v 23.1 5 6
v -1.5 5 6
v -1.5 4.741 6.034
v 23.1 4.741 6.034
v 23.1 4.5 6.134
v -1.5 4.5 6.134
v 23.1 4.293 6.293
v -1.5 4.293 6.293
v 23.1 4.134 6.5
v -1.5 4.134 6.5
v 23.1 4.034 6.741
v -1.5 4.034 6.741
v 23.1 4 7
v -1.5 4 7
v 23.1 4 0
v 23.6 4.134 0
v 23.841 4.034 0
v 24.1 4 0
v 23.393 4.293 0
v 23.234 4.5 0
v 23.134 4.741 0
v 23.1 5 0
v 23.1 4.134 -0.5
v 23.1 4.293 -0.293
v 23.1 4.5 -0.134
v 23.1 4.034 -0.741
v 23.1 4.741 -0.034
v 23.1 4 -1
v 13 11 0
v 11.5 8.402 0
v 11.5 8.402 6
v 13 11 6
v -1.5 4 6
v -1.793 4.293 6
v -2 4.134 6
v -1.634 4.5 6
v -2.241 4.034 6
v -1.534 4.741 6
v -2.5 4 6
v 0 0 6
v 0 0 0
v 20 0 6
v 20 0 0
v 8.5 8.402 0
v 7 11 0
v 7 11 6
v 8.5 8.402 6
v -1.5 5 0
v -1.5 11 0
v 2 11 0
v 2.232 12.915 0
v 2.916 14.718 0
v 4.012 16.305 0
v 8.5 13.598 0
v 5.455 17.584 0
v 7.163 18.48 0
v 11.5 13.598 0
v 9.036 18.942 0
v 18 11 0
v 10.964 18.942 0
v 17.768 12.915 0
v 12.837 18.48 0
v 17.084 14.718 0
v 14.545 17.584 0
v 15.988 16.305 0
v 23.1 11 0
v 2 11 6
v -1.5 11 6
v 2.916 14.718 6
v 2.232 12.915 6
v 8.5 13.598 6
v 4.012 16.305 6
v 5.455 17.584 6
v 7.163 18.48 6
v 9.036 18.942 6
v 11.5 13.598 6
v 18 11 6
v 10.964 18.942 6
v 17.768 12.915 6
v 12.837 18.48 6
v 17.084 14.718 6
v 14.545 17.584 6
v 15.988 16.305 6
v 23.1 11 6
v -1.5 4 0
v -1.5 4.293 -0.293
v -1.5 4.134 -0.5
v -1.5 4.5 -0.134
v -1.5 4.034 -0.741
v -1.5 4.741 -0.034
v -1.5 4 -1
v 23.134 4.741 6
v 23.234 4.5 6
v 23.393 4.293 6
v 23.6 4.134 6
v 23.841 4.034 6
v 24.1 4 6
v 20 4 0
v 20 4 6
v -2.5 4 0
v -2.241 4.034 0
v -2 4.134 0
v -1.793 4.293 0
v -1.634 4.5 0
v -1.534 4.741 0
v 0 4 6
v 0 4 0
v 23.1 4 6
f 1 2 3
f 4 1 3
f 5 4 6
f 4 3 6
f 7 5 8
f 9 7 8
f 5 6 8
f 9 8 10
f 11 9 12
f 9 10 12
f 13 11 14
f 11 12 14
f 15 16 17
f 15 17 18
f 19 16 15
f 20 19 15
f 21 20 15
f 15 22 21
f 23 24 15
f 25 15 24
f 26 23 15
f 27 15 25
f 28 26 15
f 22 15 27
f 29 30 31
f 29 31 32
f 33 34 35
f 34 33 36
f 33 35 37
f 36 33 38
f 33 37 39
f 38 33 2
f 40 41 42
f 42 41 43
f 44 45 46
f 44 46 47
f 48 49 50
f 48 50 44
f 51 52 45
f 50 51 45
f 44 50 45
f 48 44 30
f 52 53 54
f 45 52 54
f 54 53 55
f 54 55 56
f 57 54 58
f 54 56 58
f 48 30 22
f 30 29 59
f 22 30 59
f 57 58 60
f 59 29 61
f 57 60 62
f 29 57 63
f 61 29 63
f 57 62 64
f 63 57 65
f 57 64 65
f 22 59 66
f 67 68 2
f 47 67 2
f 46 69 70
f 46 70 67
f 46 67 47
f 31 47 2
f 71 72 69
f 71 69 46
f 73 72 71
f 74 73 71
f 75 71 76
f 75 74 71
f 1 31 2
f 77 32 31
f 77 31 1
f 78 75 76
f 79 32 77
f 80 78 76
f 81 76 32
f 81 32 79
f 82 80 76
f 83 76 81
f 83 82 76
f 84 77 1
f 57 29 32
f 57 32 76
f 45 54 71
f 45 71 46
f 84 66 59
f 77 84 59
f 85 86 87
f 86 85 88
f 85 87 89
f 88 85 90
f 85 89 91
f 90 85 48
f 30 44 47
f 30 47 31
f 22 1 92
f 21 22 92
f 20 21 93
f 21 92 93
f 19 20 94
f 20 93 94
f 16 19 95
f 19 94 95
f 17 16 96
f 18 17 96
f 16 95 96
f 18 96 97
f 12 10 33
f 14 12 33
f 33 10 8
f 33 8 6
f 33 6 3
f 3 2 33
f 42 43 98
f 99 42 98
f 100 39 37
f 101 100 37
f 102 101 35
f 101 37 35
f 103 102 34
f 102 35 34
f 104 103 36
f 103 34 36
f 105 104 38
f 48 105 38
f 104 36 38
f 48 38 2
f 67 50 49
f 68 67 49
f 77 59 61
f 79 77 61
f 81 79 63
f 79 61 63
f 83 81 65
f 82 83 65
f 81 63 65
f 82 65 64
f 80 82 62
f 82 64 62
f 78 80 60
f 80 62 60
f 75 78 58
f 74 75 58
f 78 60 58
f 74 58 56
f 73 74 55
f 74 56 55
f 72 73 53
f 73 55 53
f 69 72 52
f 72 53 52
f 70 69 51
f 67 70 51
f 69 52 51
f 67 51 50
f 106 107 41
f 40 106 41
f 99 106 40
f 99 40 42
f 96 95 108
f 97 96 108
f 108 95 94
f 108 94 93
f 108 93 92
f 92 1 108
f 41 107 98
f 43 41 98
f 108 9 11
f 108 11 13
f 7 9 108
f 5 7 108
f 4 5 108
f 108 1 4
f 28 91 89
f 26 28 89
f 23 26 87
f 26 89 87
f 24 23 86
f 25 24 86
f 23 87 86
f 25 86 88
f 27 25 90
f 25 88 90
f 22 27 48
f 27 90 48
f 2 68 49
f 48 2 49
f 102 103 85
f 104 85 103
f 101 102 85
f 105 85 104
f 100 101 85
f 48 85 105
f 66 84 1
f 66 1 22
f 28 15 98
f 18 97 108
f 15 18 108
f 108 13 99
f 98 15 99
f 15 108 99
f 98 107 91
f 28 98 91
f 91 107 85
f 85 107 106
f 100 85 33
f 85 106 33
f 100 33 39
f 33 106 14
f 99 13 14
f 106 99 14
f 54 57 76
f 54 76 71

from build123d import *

# Parameters (mm, degrees)
BOSS_EXTRUDE1_DEPTH = 6
BOSS_EXTRUDE2_DEPTH = 24.6
BOSS_EXTRUDE3_DEPTH = 6


with BuildPart() as part:
    # Sketch1 → Boss-Extrude1 (new body)
    with BuildSketch(Plane.XY):
        with BuildLine():
            Line((0, 0), (20, 0))
            Line((20, 0), (20, 4))
            Line((20, 4), (23.1, 4))
            Line((23.1, 4), (23.1, 11))
            Line((23.1, 11), (18, 11))
            ThreePointArc((18, 11), (10, 19), (2, 11))
            Line((2, 11), (-1.5, 11))
            Line((-1.5, 11), (-1.5, 4))
            Line((-1.5, 4), (0, 4))
            Line((0, 4), (0, 0))
        make_face()
        Polygon((13, 11), (11.5, 13.598076211), (8.5, 13.598076211), (7, 11), (8.5, 8.401923789), (11.5, 8.401923789), align=None, mode=Mode.SUBTRACT)
    extrude(amount=BOSS_EXTRUDE1_DEPTH)

    # Sketch2 → Boss-Extrude2 (add)
    with BuildSketch(Plane.ZY.offset(1.5)):
        with BuildLine():
            Line((6, 4), (6, 5))
            ThreePointArc((6, 5), (6.292893219, 4.292893219), (7, 4))
            Line((7, 4), (6, 4))
        make_face()
        with BuildLine():
            Line((0, 4), (-1, 4))
            ThreePointArc((-1, 4), (-0.292893219, 4.292893219), (0, 5))
            Line((0, 5), (0, 4))
        make_face()
    extrude(amount=-BOSS_EXTRUDE2_DEPTH)

    # Sketch4 → Boss-Extrude3 (add)
    with BuildSketch(Plane.XY.offset(6)):
        with BuildLine():
            Line((23.1, 4), (23.1, 5))
            ThreePointArc((23.1, 5), (23.392893219, 4.292893219), (24.1, 4))
            Line((24.1, 4), (23.1, 4))
        make_face()
        with BuildLine():
            Line((-1.5, 4), (-2.5, 4))
            ThreePointArc((-2.5, 4), (-1.792893219, 4.292893219), (-1.5, 5))
            Line((-1.5, 5), (-1.5, 4))
        make_face()
    extrude(amount=-BOSS_EXTRUDE3_DEPTH)


solid = part.part
